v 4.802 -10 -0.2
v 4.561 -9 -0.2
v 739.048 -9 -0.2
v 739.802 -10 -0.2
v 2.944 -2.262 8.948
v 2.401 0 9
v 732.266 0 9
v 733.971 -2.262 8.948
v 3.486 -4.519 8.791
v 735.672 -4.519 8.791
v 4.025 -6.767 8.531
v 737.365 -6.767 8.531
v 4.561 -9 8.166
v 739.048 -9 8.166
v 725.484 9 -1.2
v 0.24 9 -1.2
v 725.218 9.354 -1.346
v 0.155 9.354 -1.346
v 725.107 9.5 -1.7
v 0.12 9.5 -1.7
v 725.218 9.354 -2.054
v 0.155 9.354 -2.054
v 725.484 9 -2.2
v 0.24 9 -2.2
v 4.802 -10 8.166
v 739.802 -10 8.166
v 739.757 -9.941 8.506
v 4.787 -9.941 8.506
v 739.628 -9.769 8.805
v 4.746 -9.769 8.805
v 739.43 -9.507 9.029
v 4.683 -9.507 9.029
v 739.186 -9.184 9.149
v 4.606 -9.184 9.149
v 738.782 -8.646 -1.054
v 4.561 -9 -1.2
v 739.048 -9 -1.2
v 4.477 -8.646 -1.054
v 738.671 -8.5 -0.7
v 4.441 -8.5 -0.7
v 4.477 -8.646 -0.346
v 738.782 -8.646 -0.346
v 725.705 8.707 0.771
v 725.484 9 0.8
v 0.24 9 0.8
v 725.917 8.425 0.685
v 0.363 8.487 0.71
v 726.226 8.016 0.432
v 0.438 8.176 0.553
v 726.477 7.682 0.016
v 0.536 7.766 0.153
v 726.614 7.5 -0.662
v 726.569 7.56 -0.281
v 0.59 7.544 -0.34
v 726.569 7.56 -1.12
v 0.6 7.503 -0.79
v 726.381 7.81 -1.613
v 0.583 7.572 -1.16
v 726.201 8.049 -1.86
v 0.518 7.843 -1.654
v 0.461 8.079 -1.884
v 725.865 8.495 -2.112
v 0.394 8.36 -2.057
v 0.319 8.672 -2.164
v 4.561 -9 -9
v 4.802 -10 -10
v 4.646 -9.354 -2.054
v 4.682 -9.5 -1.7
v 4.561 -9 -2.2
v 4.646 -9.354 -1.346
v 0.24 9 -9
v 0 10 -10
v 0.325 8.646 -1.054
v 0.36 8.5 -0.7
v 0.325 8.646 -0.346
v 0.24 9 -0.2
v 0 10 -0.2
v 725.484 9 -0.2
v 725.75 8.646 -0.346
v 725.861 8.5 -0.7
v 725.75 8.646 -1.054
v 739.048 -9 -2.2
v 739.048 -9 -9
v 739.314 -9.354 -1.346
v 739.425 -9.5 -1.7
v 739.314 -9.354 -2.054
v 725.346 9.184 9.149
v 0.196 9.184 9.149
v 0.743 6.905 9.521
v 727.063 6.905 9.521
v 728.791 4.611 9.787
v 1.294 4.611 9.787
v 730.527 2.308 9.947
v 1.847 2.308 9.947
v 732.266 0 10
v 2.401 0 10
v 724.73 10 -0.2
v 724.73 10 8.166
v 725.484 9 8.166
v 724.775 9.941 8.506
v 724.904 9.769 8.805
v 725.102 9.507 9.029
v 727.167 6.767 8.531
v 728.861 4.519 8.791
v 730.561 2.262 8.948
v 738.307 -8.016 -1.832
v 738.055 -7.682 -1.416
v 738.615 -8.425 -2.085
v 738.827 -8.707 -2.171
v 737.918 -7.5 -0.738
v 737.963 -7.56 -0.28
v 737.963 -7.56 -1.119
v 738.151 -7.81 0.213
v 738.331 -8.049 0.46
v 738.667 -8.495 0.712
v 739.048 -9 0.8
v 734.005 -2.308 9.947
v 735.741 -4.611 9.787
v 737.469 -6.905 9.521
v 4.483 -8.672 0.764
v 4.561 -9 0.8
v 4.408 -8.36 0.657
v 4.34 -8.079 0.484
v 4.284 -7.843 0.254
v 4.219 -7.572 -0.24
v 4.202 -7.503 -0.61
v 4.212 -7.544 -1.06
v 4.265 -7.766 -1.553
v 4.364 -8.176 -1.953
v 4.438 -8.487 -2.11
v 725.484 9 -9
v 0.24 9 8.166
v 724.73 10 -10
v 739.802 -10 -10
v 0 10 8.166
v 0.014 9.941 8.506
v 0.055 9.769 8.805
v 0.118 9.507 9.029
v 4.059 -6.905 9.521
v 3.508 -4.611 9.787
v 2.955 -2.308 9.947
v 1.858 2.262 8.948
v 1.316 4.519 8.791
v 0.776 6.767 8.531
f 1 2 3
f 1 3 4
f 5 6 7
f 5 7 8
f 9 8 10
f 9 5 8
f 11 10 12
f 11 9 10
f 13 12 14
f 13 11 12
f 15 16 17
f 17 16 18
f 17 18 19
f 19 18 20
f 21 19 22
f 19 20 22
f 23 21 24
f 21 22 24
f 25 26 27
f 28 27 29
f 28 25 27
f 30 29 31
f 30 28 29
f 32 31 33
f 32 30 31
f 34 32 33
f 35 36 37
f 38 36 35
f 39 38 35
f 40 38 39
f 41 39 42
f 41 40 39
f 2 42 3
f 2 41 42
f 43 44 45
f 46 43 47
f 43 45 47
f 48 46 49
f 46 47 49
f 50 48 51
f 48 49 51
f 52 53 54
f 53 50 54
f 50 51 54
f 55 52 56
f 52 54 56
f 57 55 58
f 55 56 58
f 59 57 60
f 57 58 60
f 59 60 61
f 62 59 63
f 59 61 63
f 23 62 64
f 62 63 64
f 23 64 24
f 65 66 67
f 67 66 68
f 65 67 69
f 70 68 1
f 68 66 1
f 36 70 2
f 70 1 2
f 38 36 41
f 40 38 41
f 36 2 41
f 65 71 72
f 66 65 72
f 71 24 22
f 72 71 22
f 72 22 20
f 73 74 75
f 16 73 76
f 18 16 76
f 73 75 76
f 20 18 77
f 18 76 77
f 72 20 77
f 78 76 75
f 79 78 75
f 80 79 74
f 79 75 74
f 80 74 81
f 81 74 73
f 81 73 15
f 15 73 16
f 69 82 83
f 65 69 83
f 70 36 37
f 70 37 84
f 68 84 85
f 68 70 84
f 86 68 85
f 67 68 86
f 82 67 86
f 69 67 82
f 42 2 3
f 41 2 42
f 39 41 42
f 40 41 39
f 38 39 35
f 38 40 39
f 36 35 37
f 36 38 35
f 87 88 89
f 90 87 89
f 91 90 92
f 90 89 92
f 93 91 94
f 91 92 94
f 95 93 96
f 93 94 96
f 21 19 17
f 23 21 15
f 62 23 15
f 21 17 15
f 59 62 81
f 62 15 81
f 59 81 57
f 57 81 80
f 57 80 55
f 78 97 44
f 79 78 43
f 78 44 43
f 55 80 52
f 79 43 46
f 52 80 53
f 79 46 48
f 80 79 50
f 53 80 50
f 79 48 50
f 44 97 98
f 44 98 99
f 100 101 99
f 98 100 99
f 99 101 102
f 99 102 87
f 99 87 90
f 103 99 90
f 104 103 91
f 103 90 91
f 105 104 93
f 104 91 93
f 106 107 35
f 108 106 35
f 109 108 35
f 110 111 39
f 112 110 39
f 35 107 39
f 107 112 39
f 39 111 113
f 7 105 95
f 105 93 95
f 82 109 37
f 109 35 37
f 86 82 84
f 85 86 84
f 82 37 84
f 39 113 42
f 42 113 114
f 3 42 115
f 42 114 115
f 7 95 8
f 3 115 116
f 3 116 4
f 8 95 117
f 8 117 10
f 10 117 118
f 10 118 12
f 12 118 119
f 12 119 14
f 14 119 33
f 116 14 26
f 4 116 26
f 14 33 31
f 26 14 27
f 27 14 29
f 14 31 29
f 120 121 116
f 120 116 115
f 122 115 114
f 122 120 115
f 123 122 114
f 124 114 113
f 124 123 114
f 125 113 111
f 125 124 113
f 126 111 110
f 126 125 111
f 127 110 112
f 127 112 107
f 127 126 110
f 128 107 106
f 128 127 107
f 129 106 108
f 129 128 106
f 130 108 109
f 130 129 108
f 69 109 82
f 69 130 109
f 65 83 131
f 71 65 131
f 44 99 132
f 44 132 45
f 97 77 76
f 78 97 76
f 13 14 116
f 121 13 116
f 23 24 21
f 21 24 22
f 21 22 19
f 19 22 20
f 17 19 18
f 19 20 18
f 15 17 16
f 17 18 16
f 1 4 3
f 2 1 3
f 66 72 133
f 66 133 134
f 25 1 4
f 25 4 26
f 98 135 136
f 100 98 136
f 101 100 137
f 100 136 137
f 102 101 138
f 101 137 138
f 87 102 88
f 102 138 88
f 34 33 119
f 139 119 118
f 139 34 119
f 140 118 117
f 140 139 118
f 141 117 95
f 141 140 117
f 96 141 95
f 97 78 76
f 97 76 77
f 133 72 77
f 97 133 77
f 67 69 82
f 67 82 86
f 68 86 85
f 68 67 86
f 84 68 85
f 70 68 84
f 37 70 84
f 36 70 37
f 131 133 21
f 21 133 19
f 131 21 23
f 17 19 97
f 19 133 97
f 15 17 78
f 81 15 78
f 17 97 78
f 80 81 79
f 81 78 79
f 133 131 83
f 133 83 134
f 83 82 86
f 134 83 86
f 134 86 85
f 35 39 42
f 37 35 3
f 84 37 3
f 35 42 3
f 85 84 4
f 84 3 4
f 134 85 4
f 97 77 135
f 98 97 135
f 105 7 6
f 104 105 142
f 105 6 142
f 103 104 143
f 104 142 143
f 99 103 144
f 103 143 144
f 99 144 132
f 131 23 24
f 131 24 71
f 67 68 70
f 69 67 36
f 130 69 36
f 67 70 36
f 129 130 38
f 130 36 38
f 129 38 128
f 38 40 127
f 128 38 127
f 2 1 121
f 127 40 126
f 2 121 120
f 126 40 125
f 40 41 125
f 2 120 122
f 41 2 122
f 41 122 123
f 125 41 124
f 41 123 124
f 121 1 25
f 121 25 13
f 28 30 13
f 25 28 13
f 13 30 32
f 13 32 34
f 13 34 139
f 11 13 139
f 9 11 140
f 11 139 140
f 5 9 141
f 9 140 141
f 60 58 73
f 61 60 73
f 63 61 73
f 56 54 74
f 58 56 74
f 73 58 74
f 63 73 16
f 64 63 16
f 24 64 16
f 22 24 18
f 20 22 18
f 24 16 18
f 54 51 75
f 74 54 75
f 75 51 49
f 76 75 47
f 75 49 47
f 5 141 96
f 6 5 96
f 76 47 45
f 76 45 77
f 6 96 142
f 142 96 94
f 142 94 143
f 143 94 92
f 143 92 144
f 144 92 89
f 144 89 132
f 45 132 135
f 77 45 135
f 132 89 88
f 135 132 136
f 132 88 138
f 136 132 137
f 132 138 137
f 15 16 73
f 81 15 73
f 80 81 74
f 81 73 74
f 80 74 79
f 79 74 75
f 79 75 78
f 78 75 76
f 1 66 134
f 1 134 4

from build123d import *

# Parameters (mm, degrees)
F2_DEPTH      = 1000
F4_DEPTH      = 1000
F8_DEPTH      = 10.001
F8_DEPTH_BACK = 10.001


with BuildPart() as f2:
    # F1 (on Right) → F2 (new body)
    with BuildSketch(Plane.YZ):
        with BuildLine():
            Line((0, -9), (0, -10))
            Line((0, -10), (10, -10))
            Line((10, -10), (10, -0.2))
            Line((10, -0.2), (9, -0.2))
            ThreePointArc((9, -0.2), (8.5, -0.7), (9, -1.2))
            ThreePointArc((9, -1.2), (9.5, -1.7), (9, -2.2))
            Line((9, -2.2), (9, -9))
            Line((9, -9), (0, -9))
        make_face()
    extrude(amount=F2_DEPTH)

    # F5: F2 across plane


with BuildPart() as f4:
    # F3 (on Right) → F4 (new body)
    with BuildSketch(Plane.YZ):
        with BuildLine():
            Line((9, -0.2), (10, -0.2))
            Line((10, -0.2), (10, 8.1663783152))
            ThreePointArc((10, 8.1663783152), (9.7693092582, 8.8052548802), (9.1836734694, 9.1493656277))
            ThreePointArc((9.1836734694, 9.1493656277), (4.6114920912, 9.7868872364), (0, 10))
            Line((0, 10), (0, 9))
            ThreePointArc((0, 9), (4.5192622493, 8.7911494917), (9, 8.1663783152))
            Line((9, 8.1663783152), (9, 0.8))
            ThreePointArc((9, 0.8), (7.5, -0.7), (9, -2.2))
            ThreePointArc((9, -2.2), (9.5, -1.7), (9, -1.2))
            ThreePointArc((9, -1.2), (8.5, -0.7), (9, -0.2))
        make_face()
    extrude(amount=F4_DEPTH)

    # F6: F4 across plane


with BuildPart() as f2_1:
    add(f2.part)
    add(f2.part.mirror(Plane.XZ))


with BuildPart() as f4_1:
    add(f4.part)
    add(f4.part.mirror(Plane.XZ))


with BuildPart() as f8_tool:
    # F7 (on Top) → F8 (new body, two sides)
    with BuildSketch(Plane.XY) as f8_sk:
        Polygon((0, 10), (0, 0), (0, -10), (4.8015751816, -10), align=None)
        Polygon((739.8015751816, 10), (724.7304941795, 10), (739.8015751816, -10), (1016.9613361359, -10), (1016.9613361359, 10), align=None)
    extrude(amount=F8_DEPTH)
    extrude(f8_sk.sketch, amount=-F8_DEPTH_BACK)


with BuildPart() as f2_2:
    add(f2_1.part)

    # F8: cut by f8_tool
    add(f8_tool.part, mode=Mode.SUBTRACT)


with BuildPart() as f4_2:
    add(f4_1.part)

    # F8: cut by f8_tool
    add(f8_tool.part, mode=Mode.SUBTRACT)


solid = Compound([f2_2.part, f4_2.part])
